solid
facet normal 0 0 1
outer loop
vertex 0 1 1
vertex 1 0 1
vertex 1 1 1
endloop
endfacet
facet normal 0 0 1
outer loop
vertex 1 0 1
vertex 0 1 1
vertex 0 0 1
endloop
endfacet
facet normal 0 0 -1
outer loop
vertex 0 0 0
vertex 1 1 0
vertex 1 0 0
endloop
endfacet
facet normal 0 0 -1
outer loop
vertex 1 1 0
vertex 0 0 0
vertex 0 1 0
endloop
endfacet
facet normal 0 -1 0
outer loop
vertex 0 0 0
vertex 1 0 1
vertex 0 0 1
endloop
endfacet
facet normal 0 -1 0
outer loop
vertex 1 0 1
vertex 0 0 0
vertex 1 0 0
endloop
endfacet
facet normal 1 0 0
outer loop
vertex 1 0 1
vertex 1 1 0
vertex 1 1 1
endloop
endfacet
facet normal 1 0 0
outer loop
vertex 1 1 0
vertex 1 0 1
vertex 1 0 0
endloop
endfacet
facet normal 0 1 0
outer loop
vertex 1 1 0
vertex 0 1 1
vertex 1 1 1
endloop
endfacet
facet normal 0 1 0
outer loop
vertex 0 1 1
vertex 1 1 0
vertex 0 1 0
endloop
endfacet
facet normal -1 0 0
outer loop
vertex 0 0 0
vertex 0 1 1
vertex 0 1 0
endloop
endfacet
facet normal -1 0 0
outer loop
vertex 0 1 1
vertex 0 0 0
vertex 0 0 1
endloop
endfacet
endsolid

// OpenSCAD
// file: ../scon.scad
function scon_value(scon,path,missing = function(path) undef,dist = 0) =
  is_undef(path) ? missing :
  (len(path) <= dist || is_undef(scon)) ?
    (is_undef(scon) ? missing(path) : scon) :
    let (
      key = path[dist],
      next = is_undef(key) ?
        scon :
	is_string(key) ?
          _scon_map(scon, key, path) :
          _scon_index(scon, key, path)
    ) scon_value(next, path, missing, dist + 1);

// Make a property-extractor function from an SCON value.
// Basic usage:
//
//   cfg_scon = [["x",1],["y",true]];
//   cfg = scon_make([["x",1],["y",true]]);
//   x=cfg(["x"]);
//   y=cfg(["y"]);
//   z=cfg(["z"], 3); // z = 3 because it is not in cfg_scon.
//
// Advanced Meta-programming note:
//   - cfg([])   ⇒ returns the full SCON data structure.
//   - cfg(undef)⇒ returns the configured missing-fallback function.
// This allows for introspection of the data used to make cfg function.
//
function scon_make(scon,base=undef)=
  is_undef(base) ?
    function(path,missing=undef)
      scon_value(scon,path,function (missing_path) missing)
  :
    function(path,missing=undef)
      scon_value(scon,path,function (missing_path) base(missing_path,missing));

//
// Convert a scon value to a json string
//
// Ex: scon_to_json(true) == "true"
//     scon_to_json(17) == "17"
//     scon_to_json("length") == "\"length\""
//     scon_to_json([["x",1],["y",2]]) == "{\"x\":1,\"y\":2}"
//     scon_to_json([2,3,5,8]) == "[2,3,5,8]"
//
//  List/object ambiguity! Since OpenSCAD has no native map, there must be an
//  ambiguity in the conversion to the distinct [item[0],item[1],...] list
//  and the {"name0":value0,"name1":value1,..} object notation in JSON.
//
//  The rule Scon uses is:
//
//    If every element of a Vector is a [string,value] pair, then it is converted
//    to an object.  Otherwise it is a list.
//
//    So [], [["x",1],["y",2]], are maps and become "{}" and "{\"x\":1,\"y\":2}"
//    any other Vector is converted to a list.
//
function scon_to_json(scon) =
  is_undef(scon) ? "null" :
  is_bool(scon) ? str(scon) :
  is_num(scon) ? str(scon) :
  is_string(scon) ? _scon_json_str(scon) :
  _scon_is_map(scon) ? _scon_json_map(scon) :
  is_list(scon) ? _scon_json_list(scon) :
  _scon_json_str(str("??? ",scon," ???"));

//
// Development builds of OpenSCAD with the import-function feature enabled
// can import Json directly.  To convert this import to SCON, you can use this
// function.
//
// The scon_from_json.js and scon_from_json.py scripts create a back-portable way to
// do this by externally converting to
//
// Developer Build usage:
//
//   cfg = scon_make(scon_from_json(import("config.json")));
//
// Portable usage:
//
//   # from terminal or build script
//   python3 scon_from_json.py <config.json >config.scon
//   # or
//   node scon_from_json.js <config.json >config.scon
//   # or (quickjs)
//   qjs --std -m scon_from_json.js <config.json >config.scon
//
//   # in OpenSCAD
//   cfg = scon_make(include "config.scon");
//
function scon_from_json(json) =
  is_object(json)
    ? [ for (k = json) [ k, scon_from_json(json[k]) ] ]
  : is_list(json)
    ? [ for (i = [0:len(json)-1]) scon_from_json(json[i]) ]
  : json;

function _scon_map(scon_map, key, path) =
    let (result = search([key], scon_map,0)[0])
      len(result) > 0 ? scon_map[result[len(result)-1]][1] : undef;

function _scon_index(scon_list, index, path) =
    (is_list(scon_list) && 0 <= index && index < len(scon_list)) ? scon_list[index] : undef;

function _scon_is_mapping(scon) =
    is_list(scon) && len(scon) == 2 && is_string(scon[0]);

function _scon_all_seq(seq,begin,end) =
  let (n = (begin < end) ? end - begin : 0,
       m = ((n % 2) == 0) ? n/2 : (n-1) / 2)
  n > 1 ? (_scon_all_seq(seq,begin,begin+m) && _scon_all_seq(seq,begin+m,end)) :
  n == 1 ? seq(begin) : true;

function _scon_is_map(scon) =
    is_list(scon) &&
    _scon_all_seq(function(i) _scon_is_mapping(scon[i]),0,len(scon));


function _scon_str_seq(seq,begin,end) = // str(seq(begin),...,seq(end-1))
  let (n = (begin < end) ? end - begin : 0,
       m = ((n % 2) == 0) ? n/2 : (n-1) / 2)
  n > 1 ? str(_scon_str_seq(seq,begin,begin+m),_scon_str_seq(seq,begin+m,end)) :
  n == 1 ? str(seq(begin)) : "";

function _scon_str_list(list,begin=0,_end=undef) =
  let (seq = function (i) list[i],end = is_undef(_end) ? len(list) : _end)
  _scon_str_seq(seq,begin,end);

// sep can also be a lambda function of the index
function _scon_str_join_seq(seq,begin,end,sep=",") =
  let (n = (begin < end) ? end - begin : 0,
       m = ((n % 2) == 0) ? n/2 : (n-1) / 2)
  n > 1 ? str(_scon_str_join_seq(seq,begin,begin+m,sep),is_function(sep) ? sep(begin+m-1) : sep,_scon_str_join_seq(seq,begin+m,end,sep)) :
  n == 1 ? str(seq(begin)) : "";

function _scon_str_join_list(list,begin=0,_end=undef,sep=",") =
  let (seq = function (i) list[i],end = is_undef(_end) ? len(list) : _end)
  _scon_str_join_seq(seq,begin,end,sep);
  
function _scon_json_chr(c) =
  (c == "\"") ? "\\\"" :
  (c == "\\") ? "\\\\" :
  (c == "/") ? "\\/" :
  (c == "\x08") ? "\\b" :
  (c == "\x0c") ? "\\f" :
  (c == "\n") ? "\\n" :
  (c == "\r") ? "\\r" :
  (c == "\x09") ? "\\t" :
  c;  

function _scon_json_str(scon) =
  let (seq=function (i) _scon_json_chr(scon[i]))
  str("\"",_scon_str_seq(seq,0,len(scon)),"\"");

function _scon_json_map(scon) =
  let(seq=function(i) str(_scon_json_str(scon[i][0]),":",scon_to_json(scon[i][1])))
  str("{",_scon_str_join_seq(seq,0,len(scon)),"}");

function _scon_json_list(scon) =
  let(seq=function(i) scon_to_json(scon[i]))
  str("[",_scon_str_join_seq(seq,0,len(scon)),"]");
// main file
include <../scon.scad>

assert(_scon_all_seq(function (i) false,0,0) == true );
assert(_scon_all_seq(function (i) true ,0,3) == true );
assert(_scon_all_seq(function (i) false,0,3) == false);
assert(_scon_all_seq(function (i) i != 0,0,3) == false);
assert(_scon_all_seq(function (i) i != 1,0,3) == false);
assert(_scon_all_seq(function (i) i != 2,0,3) == false);

assert(_scon_all_seq(function (i) i != 0,0,10) == false);
assert(_scon_all_seq(function (i) true,0,100) == true);
assert(_scon_all_seq(function (i) i != 99,0,100) == false);
assert(_scon_all_seq(function (i) i != 50,0,100) == false);

assert(_scon_is_map("hi") == false);
assert(_scon_is_map(3.14) == false);
assert(_scon_is_map(true) == false);
assert(_scon_is_map([1,2,3]) == false);
assert(_scon_is_map([]) == true);
assert(_scon_is_map([["a",1]]) == true);
assert(_scon_is_map([["a",1],["b",1]]) == true);
spath=function(path) _scon_str_join_list(path,0,len(path),sep="/");
assert(spath(["a","b","c"]) == "a/b/c");
assert(spath(["x"]) == "x");
assert(spath([]) == "");

assert(_scon_map([["alpha",1],["beta",2]],"alpha",["dir","subdir"]) == 1);
assert(_scon_map([["alpha",1],["beta",2]],"c",["a","b"]) == undef);
assert(_scon_index([2,3,5],1,["a","b"]) == 3);
assert(_scon_index([2,3,5],6,["a","b"]) == undef);

config_scon=[["x",1],["y",[["q","why"],["a",[true,false]]]]];
assert(scon_value(config_scon,["x"]) == 1);
assert(scon_value(config_scon,["y","q"]) == "why");
assert(scon_value(config_scon,["y","a",0]) == true);
assert(scon_value(config_scon,["y","a",0,undef]) == true);
assert(scon_value(config_scon,[undef,"y","a",0,undef]) == true);
assert(scon_value(config_scon,[undef,"y",undef,"a",undef,0,undef]) == true);

function config(p0=undef,p1=undef,p2=undef,p3=undef,p4=undef,p5=undef,p6=undef,p7=undef,p8=undef,p9=undef) =
  scon_value(config_scon,[p0,p1,p2,p3,p4,p5,p6,p7,p8,p9]);

assert(config("x") == 1);
assert(config("y","q") == "why");
assert(config("y","a",0) == true);

// override y/a config for submodule
subconfig_scon = [["y",[["a",[false,true]]]]];

function subconfig(p0=undef,p1=undef,p2=undef,p3=undef,p4=undef,p5=undef,p6=undef,p7=undef,p8=undef,p9=undef) =
  scon_value(subconfig_scon,[p0,p1,p2,p3,p4,p5,p6,p7,p8,p9],
     function (path) scon_value(config_scon,path));

assert(subconfig("x") == 1);
assert(subconfig("y","q") == "why");
assert(subconfig("y","a",0) == false);

made0 = scon_make([["x",0],["y",0]]);
assert(made0(["x"]) == 0);
assert(made0(["y"]) == 0);
assert(made0(["z"]) == undef);
assert(made0(["x"],7) == 0);
assert(made0(["y"],7) == 0);
assert(made0(["z"],7) == 7);

made1 = scon_make([["x",3]],made0);
assert(made1(["x"]) == 3);
assert(made1(["y"]) == 0);
assert(made1(["z"]) == undef);
assert(made1(["x"],7) == 3);
assert(made1(["y"],7) == 0);
assert(made1(["z"],7) == 7);

assert(_scon_json_chr("a") == "a");
assert(_scon_json_chr("\"") == "\\\"");
assert(_scon_json_chr("\\") == "\\\\", _scon_json_chr("\\"));
assert(_scon_json_chr("/") == "\\/");
assert(_scon_json_chr("\x08") == "\\b");
assert(_scon_json_chr("\x0C") == "\\f");
assert(_scon_json_chr("\n") == "\\n");
assert(_scon_json_chr("\r") == "\\r");
assert(_scon_json_chr("\x09") == "\\t");

// raw string: \path/to "her's"
// scad encoded literal: "\\path/to \"her's\""
// json encoded literal: "\\path\/to \"her's\""
// scad encoded json literal: "\"\\\\path\\/to \\\"her's\\\"\""
assert(_scon_json_str("\\path/to \"her's\"") == "\"\\\\path\\/to \\\"her's\\\"\"");

assert(scon_to_json("hi") == "\"hi\"");
assert(scon_to_json(undef) == "null");
assert(scon_to_json(true) == "true");
assert(scon_to_json(false) == "false");
assert(scon_to_json(33.3) == "33.3");
assert(scon_to_json([1,2,3]) == "[1,2,3]");
assert(scon_to_json([["a",1],["b",2]]) == "{\"a\":1,\"b\":2}");
assert(scon_to_json([]) == "{}");
assert(scon_to_json([["nested",[["x",1]]]]) == "{\"nested\":{\"x\":1}}");
assert(scon_to_json([["list",[1,2,3]]]) == "{\"list\":[1,2,3]}");

// scon_make meta-programming: cfg([]) returns full scon data
assert(made0([]) == [["x",0],["y",0]]);
// scon_make meta-programming: cfg(undef) returns fallback function
assert(is_function(made0(undef)));

// large map to exercise divide-and-conquer in _scon_is_map
large_map = [ for (i=[0:99]) [str("k",i), i] ];
assert(_scon_is_map(large_map) == true);
assert(scon_value(large_map, ["k0"]) == 0);
assert(scon_value(large_map, ["k99"]) == 99);
assert(scon_value(large_map, ["k100"]) == undef);

echo("scon ok");

cube(); // so build is not empty.
